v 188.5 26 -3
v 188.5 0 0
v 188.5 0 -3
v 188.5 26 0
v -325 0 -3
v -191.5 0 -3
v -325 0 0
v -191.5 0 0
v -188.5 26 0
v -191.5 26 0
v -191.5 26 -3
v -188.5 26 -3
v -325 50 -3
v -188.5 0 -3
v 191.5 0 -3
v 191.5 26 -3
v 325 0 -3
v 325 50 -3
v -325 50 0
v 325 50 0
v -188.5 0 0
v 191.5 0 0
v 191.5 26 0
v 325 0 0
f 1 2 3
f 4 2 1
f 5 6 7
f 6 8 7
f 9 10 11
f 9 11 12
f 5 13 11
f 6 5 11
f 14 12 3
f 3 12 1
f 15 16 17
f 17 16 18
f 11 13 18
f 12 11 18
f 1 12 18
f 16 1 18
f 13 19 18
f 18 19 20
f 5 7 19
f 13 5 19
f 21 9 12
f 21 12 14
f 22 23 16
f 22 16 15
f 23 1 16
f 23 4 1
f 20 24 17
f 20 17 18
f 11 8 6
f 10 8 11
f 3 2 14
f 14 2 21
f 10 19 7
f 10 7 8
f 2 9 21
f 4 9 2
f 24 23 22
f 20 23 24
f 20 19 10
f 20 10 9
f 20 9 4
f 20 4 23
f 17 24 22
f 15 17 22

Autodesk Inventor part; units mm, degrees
ref_plane "YZ Plane" through (0, 0, 0) normal (1, 0, 0) x (0, 1, 0)
ref_plane "XZ Plane" through (0, 0, 0) normal (0, 1, 0) x (-1, 0, 0)
ref_plane "XY Plane" through (0, 0, 0) normal (0, 0, 1) x (1, 0, 0)
sketch "Sketch1" plane through (0, 0, 0) normal (0, 0, 1) x (1, 0, 0)
  line L0 (-400, 50) -> (400, 50)
  line L1 (400, 50) -> (400, 0)
  line L2 (400, 0) -> (-400, 0)
  line L3 (-400, 0) -> (-400, 50)
  circle A0 centre (-400, 0) radius 25
  circle A1 centre (400, 0) radius 25
  point P0 (0, 0)
  point P1 (0, 0)
  point P2 (-400, 25)
  point P3 (-375, 0)
  point P4 (375, 0)
  point P5 (400, 25)
  dimension "d16" = 50
  dimension "d17" = 800
  dimension "d18" = 50
  dimension "d19" = 50
extrude "Plate2" add sketch "Sketch1" against normal blind 3 contours L0 L1 A1 L2 A0 L3 | A0 L2 L3 | L1 L2 A1 picked at (-388.289, 11.711) picked at (398.1457, 16.4577)
sketch "Sketch2" plane through (0, 0, 0) normal (0, 0, 1) x (1, 0, 0)
  line L0 (400, 50) -> (-400, 50) projected
  line L1 (190, 50) -> (190, 0) construction
  line L2 (-400, 0) -> (400, 0) projected
  line L3 (188.5, 26) -> (191.5, 26)
  line L4 (191.5, 26) -> (191.5, 0)
  line L5 (191.5, 0) -> (188.5, 0)
  line L6 (188.5, 0) -> (188.5, 26)
  line L7 (-190, 0) -> (-190, 50) construction
  line L8 (-191.5, 26) -> (-188.5, 26)
  line L9 (-188.5, 26) -> (-188.5, 0)
  line L10 (-188.5, 0) -> (-191.5, 0)
  line L11 (-191.5, 0) -> (-191.5, 26)
  point P0 (0, 0)
  point P1 (0, 0)
  point P2 (188.5, 0)
  point P3 (191.5, 0)
  point P4 (0, 0)
  dimension "d21" = 190
  dimension "d22" = 3
  dimension "d23" = 26
  dimension "d26" = 190
  dimension "d27" = 26
  dimension "d28" = 3
extrude "Extrusion1" cut sketch "Sketch2" against normal blind 10
sketch "Sketch3" plane through (0, 0, 0) normal (0, 0, 1) x (1, 0, 0)
  line L0 (188.5, 0) -> (188.5, 26) projected
  line L1 (188.5, 26) -> (191.5, 26) projected
  line L2 (191.5, 26) -> (191.5, 0) projected
  line L3 (191.5, 0) -> (400, 0) projected
  line L4 (400, 0) -> (400, 50) projected
  line L5 (400, 50) -> (-400, 50) projected
  line L6 (-400, 50) -> (-400, 0) projected
  line L7 (-400, 0) -> (-191.5, 0) projected
  line L8 (-191.5, 0) -> (-191.5, 26) projected
  line L9 (-191.5, 26) -> (-188.5, 26) projected
  line L10 (-188.5, 26) -> (-188.5, 0) projected
  line L11 (-188.5, 0) -> (188.5, 0) projected
  line L12 (325, 0) -> (325, 50)
  line L13 (400, 50) -> (-400, 50) projected
  line L14 (-325, 0) -> (-325, 50)
  point P0 (0, 0)
  point P1 (325, 50)
  dimension "d29" = 75
  dimension "d30" = 75
extrude "Extrusion2" cut sketch "Sketch3" against normal through all contours L12 L5 L4 L3 | L7 L6 L5 L14
sketch "Sketch4" plane through (0, 0, -3) normal (0, 0, -1) x (-1, 0, 0)
  line L0 (-62.455, 14.7345) -> (-62.455, 33.3208) construction
  line L1 (-62.455, 33.3208) -> (59.5733, 33.3208) construction
  line L2 (59.5733, 33.3208) -> (59.5733, 14.7345) construction
  line L3 (59.5733, 14.7345) -> (-62.455, 14.7345) construction
  point P0 (0, 0)
mark "Mark1"
equation "\"d22\" = Thickness"
equation "\"d26\" = d21"
equation "\"d27\" = d23"
equation "\"d28\" = Thickness"
equation "\"d30\" = d29"
equation "\"d20\" = Thickness"
equation "\"BendReliefWidth\" = Thickness"
equation "\"BendReliefDepth\" = 0.5 * Thickness"
equation "\"CornerReliefSize\" = 4 * Thickness"
equation "\"MinimumRemnant\" = 2 * Thickness"
equation "\"TransitionRadius\" = BendRadius"
equation "\"JacobiRadiusSize\" = BendRadius"
equation "\"GapSize\" = Thickness"
equation "\"Thickness\" = 3"
equation "\"BendRadius\" = 5"
properties part number "MSC 109 rib cone" material "Stainless Steel"
